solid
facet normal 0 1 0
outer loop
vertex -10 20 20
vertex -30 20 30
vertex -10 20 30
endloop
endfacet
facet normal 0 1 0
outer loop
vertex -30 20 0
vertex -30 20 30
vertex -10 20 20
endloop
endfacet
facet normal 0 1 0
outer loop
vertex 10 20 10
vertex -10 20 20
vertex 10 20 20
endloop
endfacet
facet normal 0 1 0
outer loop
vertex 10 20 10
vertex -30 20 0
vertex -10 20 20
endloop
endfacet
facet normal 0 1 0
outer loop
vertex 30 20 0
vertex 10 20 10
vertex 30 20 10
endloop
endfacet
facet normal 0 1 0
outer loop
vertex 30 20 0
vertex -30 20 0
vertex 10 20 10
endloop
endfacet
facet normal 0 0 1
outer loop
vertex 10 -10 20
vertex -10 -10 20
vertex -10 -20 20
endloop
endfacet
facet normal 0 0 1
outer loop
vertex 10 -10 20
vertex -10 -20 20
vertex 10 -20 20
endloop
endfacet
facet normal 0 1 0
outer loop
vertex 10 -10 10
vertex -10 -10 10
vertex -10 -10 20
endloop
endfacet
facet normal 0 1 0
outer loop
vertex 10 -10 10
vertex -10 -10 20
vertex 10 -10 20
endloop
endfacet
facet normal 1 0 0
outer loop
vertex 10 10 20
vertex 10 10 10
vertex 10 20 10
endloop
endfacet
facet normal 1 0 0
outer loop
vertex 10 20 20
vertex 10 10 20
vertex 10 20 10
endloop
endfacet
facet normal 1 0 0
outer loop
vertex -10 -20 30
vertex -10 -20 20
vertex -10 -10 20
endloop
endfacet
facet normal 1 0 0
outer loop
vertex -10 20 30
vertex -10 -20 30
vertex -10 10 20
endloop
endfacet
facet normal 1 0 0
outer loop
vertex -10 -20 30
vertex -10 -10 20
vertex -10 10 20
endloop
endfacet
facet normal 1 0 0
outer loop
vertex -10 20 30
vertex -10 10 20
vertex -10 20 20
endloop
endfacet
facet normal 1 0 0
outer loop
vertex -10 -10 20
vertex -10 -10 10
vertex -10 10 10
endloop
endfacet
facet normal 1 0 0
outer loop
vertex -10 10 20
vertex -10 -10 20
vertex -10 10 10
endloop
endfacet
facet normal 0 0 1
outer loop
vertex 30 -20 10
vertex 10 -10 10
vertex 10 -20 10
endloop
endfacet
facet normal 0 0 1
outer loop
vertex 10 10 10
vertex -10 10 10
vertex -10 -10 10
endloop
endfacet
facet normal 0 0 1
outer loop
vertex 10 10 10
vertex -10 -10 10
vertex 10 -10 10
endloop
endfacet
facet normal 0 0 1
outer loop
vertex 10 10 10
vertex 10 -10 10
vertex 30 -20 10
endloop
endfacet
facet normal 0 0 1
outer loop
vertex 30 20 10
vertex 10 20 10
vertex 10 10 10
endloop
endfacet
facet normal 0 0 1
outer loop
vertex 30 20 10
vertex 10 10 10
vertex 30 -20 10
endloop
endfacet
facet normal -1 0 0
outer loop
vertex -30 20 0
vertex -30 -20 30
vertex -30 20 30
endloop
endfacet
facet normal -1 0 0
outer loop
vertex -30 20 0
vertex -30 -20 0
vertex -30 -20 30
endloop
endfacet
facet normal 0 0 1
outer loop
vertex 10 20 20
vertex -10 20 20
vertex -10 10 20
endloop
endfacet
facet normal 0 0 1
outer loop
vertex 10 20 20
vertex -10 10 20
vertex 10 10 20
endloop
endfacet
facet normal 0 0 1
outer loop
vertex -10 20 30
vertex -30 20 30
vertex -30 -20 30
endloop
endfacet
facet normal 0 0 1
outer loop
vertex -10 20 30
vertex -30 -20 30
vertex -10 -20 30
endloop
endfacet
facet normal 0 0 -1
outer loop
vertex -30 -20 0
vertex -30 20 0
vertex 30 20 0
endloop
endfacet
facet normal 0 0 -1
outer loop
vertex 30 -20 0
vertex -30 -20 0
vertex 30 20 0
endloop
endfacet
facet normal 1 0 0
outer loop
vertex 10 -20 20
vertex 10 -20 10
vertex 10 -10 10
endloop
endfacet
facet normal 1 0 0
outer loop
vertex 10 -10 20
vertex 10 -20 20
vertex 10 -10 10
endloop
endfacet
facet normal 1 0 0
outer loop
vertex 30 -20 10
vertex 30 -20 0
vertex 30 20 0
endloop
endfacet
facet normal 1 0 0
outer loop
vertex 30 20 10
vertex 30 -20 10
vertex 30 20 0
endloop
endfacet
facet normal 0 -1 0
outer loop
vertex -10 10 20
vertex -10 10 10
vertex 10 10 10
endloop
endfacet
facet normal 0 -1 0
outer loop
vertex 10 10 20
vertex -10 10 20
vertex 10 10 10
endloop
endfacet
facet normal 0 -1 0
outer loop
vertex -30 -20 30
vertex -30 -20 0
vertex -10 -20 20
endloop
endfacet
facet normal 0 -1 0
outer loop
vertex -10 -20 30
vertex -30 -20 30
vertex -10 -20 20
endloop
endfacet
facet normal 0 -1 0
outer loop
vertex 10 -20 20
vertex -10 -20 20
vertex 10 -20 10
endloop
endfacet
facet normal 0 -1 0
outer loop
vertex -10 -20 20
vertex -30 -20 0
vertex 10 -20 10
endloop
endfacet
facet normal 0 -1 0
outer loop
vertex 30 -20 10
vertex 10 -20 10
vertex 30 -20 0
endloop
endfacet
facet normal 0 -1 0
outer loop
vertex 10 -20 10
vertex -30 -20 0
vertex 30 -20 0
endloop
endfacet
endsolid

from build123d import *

# Parameters (mm, degrees)
F0_W     = 60
F0_H     = 40
F1_DEPTH = 10
F2_W     = 20
F2_H     = 40
F3_DEPTH = 20
F4_W     = 20
F4_H     = 10
F5_DEPTH = 10
F6_W     = 20
F6_H     = 10
F7_DEPTH = 10


with BuildPart() as f1:
    # F0 (on Top) → F1 (new body)
    with BuildSketch(Plane.XY):
        Rectangle(F0_W, F0_H)
    extrude(amount=F1_DEPTH)

    # F2 (on face) → F3 (join)
    with BuildSketch(Plane.XY.offset(10)):
        with Locations((-20, 0)):
            Rectangle(F2_W, F2_H)
    extrude(amount=F3_DEPTH)

    # F4 (on face) → F5 (join)
    with BuildSketch(Plane.XY.offset(10)):
        with Locations((0, -15)):
            Rectangle(F4_W, F4_H)
    extrude(amount=F5_DEPTH)

    # F6 (on face) → F7 (join)
    with BuildSketch(Plane.XY.offset(10)):
        with Locations((0, 15)):
            Rectangle(F6_W, F6_H)
    extrude(amount=F7_DEPTH)


solid = f1.part
